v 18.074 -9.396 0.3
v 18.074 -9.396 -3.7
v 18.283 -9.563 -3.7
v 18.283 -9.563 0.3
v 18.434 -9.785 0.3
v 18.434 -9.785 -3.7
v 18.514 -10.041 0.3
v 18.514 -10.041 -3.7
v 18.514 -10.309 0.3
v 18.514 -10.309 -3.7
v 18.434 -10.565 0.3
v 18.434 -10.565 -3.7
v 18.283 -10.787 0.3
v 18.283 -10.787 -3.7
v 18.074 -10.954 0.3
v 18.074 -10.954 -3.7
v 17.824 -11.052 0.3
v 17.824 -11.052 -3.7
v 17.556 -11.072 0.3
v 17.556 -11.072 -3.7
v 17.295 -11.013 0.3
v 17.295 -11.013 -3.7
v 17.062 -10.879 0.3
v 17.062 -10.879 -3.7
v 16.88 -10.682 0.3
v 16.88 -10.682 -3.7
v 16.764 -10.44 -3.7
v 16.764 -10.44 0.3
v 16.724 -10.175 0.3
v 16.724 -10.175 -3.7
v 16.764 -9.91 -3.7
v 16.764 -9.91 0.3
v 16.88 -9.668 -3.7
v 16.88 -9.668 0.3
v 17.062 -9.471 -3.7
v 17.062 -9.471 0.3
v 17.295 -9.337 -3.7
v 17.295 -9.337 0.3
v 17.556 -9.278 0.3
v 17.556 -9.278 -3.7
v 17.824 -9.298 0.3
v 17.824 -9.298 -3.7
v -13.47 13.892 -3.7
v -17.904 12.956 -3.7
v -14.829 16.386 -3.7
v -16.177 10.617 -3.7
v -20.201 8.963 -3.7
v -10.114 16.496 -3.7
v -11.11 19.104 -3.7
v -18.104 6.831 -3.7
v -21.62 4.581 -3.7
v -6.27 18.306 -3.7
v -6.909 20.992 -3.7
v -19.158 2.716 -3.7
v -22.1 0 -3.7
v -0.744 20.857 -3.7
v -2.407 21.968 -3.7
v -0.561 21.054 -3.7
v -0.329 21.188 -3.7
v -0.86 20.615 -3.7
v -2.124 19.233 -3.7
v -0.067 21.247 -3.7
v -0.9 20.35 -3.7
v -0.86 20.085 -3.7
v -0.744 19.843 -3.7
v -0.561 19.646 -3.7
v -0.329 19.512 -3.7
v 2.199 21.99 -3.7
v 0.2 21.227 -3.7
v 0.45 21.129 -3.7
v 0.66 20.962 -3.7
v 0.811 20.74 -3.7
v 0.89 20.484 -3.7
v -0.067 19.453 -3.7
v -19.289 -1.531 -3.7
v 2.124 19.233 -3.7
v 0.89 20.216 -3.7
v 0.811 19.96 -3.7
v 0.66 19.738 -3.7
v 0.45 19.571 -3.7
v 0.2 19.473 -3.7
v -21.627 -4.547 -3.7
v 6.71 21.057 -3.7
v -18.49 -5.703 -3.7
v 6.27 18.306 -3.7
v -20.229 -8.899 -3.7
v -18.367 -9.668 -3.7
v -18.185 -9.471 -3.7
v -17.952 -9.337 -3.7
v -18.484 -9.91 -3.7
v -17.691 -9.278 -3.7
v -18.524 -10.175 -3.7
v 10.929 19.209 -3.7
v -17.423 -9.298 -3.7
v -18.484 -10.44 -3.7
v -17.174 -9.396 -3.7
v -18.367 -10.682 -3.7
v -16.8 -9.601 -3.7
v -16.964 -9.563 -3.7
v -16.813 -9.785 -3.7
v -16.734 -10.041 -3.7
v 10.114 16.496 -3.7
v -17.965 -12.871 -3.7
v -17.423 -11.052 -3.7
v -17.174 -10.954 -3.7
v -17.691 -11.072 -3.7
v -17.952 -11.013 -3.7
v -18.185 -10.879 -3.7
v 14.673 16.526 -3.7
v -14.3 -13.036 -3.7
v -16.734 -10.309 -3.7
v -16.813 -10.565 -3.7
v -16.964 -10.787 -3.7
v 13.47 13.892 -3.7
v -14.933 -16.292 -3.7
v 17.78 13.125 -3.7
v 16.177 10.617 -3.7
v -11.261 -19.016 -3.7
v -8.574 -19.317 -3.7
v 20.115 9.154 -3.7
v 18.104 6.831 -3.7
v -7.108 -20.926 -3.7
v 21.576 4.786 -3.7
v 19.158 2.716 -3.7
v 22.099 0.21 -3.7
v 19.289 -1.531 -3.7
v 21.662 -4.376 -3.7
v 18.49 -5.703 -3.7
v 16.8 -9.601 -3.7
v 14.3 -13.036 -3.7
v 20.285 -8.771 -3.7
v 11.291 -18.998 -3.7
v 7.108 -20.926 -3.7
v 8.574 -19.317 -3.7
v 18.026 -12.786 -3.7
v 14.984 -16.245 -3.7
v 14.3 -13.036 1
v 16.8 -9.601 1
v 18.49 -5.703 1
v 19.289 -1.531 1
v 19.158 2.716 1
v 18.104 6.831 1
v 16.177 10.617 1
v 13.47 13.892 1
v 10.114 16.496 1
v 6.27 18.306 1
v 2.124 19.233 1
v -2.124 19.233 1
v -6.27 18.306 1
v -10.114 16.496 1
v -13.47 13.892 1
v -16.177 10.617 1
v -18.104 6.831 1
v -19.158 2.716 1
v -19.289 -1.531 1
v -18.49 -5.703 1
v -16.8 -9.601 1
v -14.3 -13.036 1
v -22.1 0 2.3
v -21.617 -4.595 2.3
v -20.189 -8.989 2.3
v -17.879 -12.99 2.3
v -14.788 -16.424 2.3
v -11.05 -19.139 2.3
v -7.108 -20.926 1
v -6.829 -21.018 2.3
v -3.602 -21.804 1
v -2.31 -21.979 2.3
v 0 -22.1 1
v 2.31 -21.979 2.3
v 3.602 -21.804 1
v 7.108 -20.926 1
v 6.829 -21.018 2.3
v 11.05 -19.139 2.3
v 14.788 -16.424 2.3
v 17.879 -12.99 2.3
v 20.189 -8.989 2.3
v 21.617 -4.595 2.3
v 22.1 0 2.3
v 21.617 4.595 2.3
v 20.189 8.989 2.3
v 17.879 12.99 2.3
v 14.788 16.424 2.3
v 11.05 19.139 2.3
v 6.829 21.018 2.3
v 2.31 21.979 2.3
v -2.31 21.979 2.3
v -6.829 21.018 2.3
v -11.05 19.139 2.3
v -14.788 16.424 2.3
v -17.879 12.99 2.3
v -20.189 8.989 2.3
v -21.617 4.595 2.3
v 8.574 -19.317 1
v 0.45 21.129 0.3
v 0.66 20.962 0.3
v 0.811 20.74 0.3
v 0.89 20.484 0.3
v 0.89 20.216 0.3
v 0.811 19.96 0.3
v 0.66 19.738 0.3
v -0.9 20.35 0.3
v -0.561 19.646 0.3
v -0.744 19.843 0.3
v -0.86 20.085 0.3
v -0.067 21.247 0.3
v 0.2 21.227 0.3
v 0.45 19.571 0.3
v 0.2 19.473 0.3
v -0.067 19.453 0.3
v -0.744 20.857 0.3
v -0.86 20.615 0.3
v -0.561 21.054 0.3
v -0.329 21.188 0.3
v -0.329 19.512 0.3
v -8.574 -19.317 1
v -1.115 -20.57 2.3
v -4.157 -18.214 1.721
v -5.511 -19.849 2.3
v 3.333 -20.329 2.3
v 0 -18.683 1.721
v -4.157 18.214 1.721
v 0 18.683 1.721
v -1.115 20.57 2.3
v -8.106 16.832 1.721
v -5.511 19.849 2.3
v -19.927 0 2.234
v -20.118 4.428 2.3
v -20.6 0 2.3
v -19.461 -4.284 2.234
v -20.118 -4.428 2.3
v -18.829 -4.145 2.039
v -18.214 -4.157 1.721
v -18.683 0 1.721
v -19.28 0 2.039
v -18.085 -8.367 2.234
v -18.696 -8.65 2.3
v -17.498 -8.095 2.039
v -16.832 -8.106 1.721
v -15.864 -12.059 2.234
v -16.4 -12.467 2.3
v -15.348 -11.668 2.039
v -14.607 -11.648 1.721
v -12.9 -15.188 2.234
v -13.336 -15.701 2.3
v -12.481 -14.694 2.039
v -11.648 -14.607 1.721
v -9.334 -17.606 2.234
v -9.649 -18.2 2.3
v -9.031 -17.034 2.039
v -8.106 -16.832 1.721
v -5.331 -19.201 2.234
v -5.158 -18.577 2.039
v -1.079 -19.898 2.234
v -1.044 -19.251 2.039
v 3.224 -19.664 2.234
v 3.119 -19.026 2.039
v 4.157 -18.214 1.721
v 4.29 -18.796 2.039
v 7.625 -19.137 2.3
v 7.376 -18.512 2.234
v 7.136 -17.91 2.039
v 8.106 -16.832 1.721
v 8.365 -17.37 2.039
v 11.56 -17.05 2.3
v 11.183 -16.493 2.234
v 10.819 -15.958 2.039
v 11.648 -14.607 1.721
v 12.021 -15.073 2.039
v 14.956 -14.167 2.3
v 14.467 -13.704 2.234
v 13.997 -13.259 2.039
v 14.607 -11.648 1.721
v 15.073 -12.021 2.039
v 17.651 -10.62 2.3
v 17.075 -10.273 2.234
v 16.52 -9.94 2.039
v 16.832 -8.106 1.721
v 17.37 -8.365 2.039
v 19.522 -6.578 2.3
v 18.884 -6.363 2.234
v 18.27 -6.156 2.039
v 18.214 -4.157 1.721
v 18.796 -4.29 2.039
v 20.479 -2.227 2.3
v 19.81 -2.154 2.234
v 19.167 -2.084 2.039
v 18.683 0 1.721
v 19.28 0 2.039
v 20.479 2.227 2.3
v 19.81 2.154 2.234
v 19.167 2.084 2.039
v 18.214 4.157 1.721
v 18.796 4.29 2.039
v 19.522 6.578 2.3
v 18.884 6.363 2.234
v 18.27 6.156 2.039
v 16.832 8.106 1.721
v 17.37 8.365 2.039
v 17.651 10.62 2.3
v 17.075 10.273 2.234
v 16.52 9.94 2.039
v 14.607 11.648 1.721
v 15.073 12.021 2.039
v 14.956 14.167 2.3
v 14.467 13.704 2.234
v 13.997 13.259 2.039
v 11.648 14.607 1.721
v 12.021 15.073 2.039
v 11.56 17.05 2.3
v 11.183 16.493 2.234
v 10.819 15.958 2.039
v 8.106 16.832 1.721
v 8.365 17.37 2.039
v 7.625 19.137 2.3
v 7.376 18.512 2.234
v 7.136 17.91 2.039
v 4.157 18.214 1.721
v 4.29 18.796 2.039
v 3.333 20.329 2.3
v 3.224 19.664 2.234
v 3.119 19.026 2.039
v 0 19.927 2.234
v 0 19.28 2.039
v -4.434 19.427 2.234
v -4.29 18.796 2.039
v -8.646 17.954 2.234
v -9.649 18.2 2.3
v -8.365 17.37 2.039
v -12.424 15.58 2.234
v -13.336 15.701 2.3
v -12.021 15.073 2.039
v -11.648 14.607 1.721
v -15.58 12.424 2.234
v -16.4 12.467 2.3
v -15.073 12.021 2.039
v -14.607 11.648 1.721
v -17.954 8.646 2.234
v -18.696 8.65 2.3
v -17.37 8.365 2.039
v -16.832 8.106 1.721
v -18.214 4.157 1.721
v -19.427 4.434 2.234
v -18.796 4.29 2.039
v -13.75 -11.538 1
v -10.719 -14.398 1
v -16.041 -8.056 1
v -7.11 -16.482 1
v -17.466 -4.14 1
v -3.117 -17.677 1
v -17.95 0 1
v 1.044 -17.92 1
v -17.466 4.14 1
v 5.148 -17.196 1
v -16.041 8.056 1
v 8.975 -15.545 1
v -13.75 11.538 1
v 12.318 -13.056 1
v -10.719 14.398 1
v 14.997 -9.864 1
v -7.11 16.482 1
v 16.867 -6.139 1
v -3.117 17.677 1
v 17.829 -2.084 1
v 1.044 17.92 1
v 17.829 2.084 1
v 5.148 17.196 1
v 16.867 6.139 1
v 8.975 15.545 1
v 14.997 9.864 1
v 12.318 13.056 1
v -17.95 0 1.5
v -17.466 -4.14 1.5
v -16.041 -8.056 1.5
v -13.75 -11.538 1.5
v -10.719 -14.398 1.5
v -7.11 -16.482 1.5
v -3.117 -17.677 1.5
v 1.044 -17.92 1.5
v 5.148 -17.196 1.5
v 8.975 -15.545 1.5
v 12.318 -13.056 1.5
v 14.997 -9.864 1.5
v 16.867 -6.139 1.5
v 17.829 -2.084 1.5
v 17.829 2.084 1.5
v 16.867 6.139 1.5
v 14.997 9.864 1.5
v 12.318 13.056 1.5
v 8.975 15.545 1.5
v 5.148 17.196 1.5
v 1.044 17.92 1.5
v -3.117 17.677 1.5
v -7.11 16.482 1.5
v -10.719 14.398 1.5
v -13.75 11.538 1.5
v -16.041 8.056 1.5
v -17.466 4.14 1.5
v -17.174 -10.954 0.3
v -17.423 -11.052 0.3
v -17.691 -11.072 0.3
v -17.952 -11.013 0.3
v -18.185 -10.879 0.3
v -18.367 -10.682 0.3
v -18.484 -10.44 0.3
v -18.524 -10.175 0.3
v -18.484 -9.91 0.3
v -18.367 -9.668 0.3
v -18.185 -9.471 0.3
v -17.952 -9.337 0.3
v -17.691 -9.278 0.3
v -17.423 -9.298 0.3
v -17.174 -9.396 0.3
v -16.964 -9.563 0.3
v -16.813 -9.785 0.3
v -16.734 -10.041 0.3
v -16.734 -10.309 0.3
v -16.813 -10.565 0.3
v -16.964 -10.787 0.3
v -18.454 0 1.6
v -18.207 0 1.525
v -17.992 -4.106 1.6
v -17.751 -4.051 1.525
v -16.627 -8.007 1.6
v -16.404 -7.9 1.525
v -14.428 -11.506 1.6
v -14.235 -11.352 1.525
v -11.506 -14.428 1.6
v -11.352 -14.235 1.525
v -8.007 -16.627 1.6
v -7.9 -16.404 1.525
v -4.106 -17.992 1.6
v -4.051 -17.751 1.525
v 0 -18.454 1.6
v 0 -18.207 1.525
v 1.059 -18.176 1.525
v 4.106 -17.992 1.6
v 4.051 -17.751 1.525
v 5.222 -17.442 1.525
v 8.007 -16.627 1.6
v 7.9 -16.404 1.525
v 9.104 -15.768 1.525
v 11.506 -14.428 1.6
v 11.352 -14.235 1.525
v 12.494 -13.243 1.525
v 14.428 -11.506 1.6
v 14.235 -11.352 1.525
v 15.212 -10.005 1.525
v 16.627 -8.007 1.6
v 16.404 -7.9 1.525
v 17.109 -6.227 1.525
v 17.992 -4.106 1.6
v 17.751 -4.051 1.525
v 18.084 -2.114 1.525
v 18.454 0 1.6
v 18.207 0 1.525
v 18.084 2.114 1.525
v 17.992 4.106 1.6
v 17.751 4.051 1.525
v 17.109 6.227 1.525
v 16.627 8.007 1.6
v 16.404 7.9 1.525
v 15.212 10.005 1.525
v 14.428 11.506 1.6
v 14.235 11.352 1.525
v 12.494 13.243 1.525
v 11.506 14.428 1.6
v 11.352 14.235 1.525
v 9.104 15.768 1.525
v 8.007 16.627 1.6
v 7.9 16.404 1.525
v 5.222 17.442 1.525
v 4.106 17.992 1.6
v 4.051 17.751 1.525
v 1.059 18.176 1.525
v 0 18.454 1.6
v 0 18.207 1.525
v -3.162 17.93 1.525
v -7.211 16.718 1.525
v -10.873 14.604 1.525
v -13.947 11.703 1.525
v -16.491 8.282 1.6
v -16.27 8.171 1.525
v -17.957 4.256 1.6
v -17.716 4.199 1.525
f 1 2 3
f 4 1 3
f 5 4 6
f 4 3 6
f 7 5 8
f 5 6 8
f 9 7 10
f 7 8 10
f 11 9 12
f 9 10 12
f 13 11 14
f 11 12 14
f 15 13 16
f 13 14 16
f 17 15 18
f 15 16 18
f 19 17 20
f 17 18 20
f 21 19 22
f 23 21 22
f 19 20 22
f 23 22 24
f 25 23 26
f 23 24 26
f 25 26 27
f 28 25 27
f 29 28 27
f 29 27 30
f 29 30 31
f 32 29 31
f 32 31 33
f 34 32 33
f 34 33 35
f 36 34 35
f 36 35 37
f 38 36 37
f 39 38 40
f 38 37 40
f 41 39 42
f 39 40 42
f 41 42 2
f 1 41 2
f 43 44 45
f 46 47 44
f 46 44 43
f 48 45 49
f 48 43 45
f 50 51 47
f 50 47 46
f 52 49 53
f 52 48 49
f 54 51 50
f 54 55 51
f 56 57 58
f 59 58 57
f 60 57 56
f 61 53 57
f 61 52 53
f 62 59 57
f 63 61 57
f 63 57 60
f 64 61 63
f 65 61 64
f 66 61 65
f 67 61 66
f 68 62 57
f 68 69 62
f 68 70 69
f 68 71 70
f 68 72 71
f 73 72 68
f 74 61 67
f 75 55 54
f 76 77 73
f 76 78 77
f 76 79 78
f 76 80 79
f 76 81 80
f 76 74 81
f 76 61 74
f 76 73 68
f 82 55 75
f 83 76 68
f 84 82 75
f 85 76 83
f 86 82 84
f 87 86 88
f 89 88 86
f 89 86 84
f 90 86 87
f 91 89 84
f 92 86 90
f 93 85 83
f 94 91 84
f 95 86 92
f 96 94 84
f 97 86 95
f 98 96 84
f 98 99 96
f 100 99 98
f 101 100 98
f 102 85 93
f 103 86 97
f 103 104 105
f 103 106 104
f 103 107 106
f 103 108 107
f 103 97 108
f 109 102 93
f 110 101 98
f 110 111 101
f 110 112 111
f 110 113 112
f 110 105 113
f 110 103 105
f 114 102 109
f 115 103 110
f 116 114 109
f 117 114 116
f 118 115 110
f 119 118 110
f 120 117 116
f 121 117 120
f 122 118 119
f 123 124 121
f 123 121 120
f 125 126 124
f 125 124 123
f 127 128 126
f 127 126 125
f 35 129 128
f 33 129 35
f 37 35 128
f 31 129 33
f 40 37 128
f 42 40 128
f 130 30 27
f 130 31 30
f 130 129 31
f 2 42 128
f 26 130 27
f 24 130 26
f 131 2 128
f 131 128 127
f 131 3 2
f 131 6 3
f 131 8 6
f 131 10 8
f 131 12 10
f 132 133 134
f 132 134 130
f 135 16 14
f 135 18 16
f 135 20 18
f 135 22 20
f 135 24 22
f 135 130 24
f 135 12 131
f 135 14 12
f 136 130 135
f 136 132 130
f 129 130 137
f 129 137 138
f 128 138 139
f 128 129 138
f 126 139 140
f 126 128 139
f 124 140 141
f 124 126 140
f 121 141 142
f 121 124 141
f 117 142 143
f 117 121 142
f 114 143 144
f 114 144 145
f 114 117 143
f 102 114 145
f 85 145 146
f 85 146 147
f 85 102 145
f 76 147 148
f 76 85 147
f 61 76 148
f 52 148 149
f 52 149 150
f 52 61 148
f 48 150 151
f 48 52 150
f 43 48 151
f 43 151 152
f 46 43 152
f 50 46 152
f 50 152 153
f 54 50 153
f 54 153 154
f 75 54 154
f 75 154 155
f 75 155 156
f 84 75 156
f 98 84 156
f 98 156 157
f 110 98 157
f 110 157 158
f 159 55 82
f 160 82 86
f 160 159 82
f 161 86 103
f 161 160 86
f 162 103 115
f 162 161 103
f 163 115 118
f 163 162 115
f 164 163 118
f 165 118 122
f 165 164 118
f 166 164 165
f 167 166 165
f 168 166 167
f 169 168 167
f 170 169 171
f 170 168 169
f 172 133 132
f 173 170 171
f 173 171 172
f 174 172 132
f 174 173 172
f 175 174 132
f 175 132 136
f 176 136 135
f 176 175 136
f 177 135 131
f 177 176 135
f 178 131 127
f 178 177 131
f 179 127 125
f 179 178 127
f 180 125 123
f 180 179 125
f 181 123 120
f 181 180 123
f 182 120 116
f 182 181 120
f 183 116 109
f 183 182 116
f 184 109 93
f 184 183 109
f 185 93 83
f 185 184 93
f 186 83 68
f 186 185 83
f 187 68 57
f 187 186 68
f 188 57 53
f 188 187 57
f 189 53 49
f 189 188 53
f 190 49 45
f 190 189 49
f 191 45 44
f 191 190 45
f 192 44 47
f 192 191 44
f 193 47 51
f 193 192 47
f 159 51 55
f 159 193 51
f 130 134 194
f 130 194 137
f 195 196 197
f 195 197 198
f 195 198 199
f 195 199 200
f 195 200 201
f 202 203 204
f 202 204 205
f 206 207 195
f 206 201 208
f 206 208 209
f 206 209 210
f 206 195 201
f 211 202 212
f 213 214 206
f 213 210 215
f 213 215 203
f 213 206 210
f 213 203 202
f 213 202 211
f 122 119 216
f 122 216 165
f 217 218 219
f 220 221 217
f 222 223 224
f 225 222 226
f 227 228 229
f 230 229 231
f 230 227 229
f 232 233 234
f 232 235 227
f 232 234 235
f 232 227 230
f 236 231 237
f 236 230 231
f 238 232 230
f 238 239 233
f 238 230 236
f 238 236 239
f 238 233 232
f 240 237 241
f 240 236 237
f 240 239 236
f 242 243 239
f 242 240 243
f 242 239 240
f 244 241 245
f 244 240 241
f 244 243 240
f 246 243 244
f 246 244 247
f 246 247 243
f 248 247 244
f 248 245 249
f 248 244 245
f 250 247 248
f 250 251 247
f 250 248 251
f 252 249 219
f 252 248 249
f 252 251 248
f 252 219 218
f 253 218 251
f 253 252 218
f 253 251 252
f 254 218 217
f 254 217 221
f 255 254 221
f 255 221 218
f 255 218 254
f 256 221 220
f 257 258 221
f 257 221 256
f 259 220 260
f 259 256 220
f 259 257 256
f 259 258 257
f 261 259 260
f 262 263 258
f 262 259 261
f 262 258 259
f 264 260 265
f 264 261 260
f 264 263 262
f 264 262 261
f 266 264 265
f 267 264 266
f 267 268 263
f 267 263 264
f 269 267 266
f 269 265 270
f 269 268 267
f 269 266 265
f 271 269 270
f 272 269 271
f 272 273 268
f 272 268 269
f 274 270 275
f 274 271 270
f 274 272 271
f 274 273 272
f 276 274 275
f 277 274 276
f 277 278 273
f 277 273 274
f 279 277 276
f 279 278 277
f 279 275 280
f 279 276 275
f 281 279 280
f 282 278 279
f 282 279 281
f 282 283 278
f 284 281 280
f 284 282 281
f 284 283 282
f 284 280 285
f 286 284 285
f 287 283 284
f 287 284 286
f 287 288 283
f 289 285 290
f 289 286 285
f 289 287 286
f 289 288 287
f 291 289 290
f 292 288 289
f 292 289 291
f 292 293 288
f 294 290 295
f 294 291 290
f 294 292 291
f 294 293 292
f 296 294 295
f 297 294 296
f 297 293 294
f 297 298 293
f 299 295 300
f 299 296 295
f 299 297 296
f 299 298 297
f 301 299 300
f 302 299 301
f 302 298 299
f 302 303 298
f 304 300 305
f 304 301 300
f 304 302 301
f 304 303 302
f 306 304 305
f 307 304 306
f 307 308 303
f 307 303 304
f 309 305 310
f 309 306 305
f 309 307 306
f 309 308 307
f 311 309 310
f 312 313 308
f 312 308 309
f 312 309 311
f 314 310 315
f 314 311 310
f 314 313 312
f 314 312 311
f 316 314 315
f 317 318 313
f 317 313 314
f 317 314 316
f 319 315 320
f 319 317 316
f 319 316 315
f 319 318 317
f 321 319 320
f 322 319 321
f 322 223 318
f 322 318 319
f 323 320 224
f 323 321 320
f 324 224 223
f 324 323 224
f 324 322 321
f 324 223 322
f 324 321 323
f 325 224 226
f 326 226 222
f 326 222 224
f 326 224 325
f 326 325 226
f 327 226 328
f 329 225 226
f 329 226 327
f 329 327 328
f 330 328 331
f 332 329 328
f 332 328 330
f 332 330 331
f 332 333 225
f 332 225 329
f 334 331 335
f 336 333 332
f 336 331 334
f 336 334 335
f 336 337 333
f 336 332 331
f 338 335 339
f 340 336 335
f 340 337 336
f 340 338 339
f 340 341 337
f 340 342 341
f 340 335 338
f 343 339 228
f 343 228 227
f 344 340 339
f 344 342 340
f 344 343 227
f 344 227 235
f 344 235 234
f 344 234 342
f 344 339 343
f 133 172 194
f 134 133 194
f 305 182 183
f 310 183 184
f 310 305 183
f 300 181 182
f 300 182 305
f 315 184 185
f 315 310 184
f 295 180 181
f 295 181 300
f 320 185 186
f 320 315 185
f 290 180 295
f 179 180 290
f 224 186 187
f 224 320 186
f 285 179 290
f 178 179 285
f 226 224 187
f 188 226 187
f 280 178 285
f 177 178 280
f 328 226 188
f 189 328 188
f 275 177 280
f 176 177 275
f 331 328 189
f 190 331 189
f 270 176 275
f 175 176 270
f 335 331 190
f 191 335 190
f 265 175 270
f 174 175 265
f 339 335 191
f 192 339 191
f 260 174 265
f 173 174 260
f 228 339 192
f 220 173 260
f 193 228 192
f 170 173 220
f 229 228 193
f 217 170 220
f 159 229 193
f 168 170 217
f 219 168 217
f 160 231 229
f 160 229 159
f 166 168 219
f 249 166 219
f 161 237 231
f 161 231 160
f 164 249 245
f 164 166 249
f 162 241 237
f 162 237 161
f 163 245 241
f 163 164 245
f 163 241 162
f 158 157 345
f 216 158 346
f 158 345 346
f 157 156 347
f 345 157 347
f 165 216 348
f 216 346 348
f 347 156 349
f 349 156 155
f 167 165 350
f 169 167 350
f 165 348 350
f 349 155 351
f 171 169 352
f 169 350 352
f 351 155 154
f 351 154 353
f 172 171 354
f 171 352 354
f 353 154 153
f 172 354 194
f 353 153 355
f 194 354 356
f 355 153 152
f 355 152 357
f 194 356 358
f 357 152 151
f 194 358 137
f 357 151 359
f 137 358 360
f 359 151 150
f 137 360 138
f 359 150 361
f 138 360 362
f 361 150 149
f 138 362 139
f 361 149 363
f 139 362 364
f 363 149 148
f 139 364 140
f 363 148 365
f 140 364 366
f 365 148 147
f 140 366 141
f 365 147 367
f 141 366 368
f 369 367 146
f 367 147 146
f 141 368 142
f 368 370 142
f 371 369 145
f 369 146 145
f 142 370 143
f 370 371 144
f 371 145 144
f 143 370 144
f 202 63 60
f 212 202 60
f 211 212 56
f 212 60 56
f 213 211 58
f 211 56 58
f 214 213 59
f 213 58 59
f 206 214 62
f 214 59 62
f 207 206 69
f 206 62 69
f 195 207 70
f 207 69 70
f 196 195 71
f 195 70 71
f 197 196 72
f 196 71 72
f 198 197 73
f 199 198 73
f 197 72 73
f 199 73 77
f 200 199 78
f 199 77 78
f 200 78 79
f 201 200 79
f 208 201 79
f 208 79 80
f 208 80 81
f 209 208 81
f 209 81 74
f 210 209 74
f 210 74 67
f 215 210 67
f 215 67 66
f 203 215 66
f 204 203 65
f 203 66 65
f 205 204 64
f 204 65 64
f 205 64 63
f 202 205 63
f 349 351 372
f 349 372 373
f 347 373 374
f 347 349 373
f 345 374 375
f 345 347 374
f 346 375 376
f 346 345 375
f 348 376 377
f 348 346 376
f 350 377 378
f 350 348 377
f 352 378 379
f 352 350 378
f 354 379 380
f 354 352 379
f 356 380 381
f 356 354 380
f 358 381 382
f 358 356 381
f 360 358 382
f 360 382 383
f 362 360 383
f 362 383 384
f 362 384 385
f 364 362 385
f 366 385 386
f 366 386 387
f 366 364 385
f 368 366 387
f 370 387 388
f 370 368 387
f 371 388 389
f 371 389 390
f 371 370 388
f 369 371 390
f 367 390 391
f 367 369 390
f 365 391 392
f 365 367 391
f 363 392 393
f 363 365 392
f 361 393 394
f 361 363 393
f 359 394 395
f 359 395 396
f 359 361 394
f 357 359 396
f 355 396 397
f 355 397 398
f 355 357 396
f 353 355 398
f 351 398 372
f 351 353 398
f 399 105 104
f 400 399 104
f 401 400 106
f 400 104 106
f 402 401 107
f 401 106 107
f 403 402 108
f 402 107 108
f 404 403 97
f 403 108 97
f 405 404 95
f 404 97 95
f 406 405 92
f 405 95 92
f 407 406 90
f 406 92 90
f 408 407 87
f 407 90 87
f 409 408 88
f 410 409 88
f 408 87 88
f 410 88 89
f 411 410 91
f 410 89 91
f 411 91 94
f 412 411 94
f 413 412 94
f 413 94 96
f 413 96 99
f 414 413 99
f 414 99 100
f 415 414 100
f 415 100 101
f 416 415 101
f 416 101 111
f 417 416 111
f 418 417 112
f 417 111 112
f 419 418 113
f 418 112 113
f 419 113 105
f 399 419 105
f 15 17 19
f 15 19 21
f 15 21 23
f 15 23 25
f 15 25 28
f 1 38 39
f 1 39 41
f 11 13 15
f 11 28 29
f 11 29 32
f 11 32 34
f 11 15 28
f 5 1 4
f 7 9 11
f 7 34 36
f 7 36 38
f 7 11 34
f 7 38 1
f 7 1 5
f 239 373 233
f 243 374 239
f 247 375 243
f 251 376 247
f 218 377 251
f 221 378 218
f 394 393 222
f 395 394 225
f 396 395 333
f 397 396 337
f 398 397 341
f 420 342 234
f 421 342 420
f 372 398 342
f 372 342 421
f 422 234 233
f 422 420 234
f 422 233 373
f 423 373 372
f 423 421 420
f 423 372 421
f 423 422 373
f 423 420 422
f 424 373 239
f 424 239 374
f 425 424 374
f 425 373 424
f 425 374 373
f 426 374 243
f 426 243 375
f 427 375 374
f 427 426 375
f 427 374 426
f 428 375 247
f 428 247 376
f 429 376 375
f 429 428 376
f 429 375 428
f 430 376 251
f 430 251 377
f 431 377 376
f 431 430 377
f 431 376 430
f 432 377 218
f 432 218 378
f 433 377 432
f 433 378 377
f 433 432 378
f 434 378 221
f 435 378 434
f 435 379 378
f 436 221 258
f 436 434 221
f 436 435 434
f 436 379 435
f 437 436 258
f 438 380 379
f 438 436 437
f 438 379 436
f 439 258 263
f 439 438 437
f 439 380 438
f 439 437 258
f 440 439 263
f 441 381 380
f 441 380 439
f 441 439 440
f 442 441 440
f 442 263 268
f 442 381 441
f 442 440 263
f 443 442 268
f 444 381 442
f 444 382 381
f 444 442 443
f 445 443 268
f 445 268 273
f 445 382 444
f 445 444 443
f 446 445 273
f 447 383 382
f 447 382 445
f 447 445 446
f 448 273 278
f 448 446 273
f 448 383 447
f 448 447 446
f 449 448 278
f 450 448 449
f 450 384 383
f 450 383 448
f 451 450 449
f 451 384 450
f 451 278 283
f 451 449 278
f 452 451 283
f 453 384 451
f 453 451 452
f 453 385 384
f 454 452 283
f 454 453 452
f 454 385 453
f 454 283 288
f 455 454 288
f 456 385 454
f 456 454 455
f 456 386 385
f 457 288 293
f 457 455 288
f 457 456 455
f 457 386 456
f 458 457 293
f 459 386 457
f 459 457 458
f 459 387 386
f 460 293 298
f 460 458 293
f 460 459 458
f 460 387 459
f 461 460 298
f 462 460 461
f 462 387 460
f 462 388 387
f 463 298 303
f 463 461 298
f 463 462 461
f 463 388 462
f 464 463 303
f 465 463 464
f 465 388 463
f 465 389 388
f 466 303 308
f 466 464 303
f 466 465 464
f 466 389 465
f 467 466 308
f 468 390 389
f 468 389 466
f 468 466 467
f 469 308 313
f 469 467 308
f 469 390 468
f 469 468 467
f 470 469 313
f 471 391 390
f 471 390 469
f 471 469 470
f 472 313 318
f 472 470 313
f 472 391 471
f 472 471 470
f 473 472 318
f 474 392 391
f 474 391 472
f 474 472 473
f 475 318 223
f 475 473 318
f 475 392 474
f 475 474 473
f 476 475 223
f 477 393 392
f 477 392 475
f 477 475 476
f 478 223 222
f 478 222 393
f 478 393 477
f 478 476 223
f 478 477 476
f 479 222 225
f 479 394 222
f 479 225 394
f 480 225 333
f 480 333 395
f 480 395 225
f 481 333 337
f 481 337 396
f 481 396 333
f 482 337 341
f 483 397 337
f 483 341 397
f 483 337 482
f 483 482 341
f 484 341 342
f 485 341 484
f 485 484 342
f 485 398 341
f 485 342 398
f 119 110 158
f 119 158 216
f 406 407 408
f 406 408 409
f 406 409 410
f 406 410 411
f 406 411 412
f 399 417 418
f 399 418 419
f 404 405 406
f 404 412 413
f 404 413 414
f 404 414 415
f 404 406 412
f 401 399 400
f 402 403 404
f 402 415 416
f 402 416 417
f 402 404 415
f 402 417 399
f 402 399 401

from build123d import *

# Parameters (mm, degrees)
CUT_EXTRUDE_2_DEPTH      = 1
CUT_EXTRUDE_2_DEPTH_BACK = 32.472368834
SKETCH_3_R               = 0.9
CUT_EXTRUDE_3_DEPTH      = 4
PATTERN_CIRCULAR_1_COUNT = 3


with BuildPart() as part:
    # ｽｹｯﾁ1 → 回転1 (revolve)
    with BuildSketch(Plane(origin=(0, 0, 0), x_dir=(1, 0, 0), z_dir=(0, 1, 0)), mode=Mode.PRIVATE) as revolve_1_sk:
        with BuildLine():
            Line((17.95, -1.5), (17.95, 3.7))
            Line((17.95, 3.7), (22.1, 3.7))
            Line((22.1, 3.7), (22.1, -2.3))
            Line((22.1, -2.3), (20.6, -2.3))
            ThreePointArc((20.6, -2.3), (19.598521282, -2.152129029), (18.682513342, -1.721136103))
            ThreePointArc((18.682513342, -1.721136103), (18.332582335, -1.556489289), (17.95, -1.5))
        make_face()
    revolve(revolve_1_sk.sketch.rotate(Axis((0, 0, -23.242467286), (0, 0, 1)), 180), axis=Axis((0, 0, -23.242467286), (0, 0, 1)))

    # ｽｹｯﾁ2 → ｶｯﾄ - 押し出し2 (cut, two sides: drawn at the far end of the back side and taken through both)
    with BuildSketch(Plane.XY.offset(-CUT_EXTRUDE_2_DEPTH_BACK)):
        with BuildLine():
            Line((-14.300155258, -13.03564573), (-8.573902611, -19.317367678))
            Line((-8.573902611, -19.317367678), (-4.755467222, -23.5062065))
            Line((-4.755467222, -23.5062065), (4.755467222, -23.5062065))
            Line((4.755467222, -23.5062065), (8.573902611, -19.317367678))
            Line((8.573902611, -19.317367678), (14.300155258, -13.03564573))
            ThreePointArc((14.300155258, -13.03564573), (0, 19.35), (-14.300155258, -13.03564573))
        make_face()
    extrude(amount=CUT_EXTRUDE_2_DEPTH + CUT_EXTRUDE_2_DEPTH_BACK, mode=Mode.SUBTRACT)

    # ｽｹｯﾁ3 → ｶｯﾄ - 押し出し3 (cut)
    with BuildSketch(Plane(origin=(0, 0, -3.7), x_dir=(-1, 0, 0), z_dir=(0, 0, -1))):
        with Locations((0, 20.35)):
            Circle(SKETCH_3_R)
    cut_extrude_3 = extrude(amount=-CUT_EXTRUDE_3_DEPTH, mode=Mode.SUBTRACT)

    # 円形ﾊﾟﾀｰﾝ1: ｶｯﾄ - 押し出し3 ×3 about axis
    pattern_circular_1_axis = Axis((0, 0, 0), (0, 0, 1))
    for i in range(1, PATTERN_CIRCULAR_1_COUNT):
        add(cut_extrude_3.rotate(pattern_circular_1_axis, i * 360 / PATTERN_CIRCULAR_1_COUNT), mode=Mode.SUBTRACT)


solid = part.part
